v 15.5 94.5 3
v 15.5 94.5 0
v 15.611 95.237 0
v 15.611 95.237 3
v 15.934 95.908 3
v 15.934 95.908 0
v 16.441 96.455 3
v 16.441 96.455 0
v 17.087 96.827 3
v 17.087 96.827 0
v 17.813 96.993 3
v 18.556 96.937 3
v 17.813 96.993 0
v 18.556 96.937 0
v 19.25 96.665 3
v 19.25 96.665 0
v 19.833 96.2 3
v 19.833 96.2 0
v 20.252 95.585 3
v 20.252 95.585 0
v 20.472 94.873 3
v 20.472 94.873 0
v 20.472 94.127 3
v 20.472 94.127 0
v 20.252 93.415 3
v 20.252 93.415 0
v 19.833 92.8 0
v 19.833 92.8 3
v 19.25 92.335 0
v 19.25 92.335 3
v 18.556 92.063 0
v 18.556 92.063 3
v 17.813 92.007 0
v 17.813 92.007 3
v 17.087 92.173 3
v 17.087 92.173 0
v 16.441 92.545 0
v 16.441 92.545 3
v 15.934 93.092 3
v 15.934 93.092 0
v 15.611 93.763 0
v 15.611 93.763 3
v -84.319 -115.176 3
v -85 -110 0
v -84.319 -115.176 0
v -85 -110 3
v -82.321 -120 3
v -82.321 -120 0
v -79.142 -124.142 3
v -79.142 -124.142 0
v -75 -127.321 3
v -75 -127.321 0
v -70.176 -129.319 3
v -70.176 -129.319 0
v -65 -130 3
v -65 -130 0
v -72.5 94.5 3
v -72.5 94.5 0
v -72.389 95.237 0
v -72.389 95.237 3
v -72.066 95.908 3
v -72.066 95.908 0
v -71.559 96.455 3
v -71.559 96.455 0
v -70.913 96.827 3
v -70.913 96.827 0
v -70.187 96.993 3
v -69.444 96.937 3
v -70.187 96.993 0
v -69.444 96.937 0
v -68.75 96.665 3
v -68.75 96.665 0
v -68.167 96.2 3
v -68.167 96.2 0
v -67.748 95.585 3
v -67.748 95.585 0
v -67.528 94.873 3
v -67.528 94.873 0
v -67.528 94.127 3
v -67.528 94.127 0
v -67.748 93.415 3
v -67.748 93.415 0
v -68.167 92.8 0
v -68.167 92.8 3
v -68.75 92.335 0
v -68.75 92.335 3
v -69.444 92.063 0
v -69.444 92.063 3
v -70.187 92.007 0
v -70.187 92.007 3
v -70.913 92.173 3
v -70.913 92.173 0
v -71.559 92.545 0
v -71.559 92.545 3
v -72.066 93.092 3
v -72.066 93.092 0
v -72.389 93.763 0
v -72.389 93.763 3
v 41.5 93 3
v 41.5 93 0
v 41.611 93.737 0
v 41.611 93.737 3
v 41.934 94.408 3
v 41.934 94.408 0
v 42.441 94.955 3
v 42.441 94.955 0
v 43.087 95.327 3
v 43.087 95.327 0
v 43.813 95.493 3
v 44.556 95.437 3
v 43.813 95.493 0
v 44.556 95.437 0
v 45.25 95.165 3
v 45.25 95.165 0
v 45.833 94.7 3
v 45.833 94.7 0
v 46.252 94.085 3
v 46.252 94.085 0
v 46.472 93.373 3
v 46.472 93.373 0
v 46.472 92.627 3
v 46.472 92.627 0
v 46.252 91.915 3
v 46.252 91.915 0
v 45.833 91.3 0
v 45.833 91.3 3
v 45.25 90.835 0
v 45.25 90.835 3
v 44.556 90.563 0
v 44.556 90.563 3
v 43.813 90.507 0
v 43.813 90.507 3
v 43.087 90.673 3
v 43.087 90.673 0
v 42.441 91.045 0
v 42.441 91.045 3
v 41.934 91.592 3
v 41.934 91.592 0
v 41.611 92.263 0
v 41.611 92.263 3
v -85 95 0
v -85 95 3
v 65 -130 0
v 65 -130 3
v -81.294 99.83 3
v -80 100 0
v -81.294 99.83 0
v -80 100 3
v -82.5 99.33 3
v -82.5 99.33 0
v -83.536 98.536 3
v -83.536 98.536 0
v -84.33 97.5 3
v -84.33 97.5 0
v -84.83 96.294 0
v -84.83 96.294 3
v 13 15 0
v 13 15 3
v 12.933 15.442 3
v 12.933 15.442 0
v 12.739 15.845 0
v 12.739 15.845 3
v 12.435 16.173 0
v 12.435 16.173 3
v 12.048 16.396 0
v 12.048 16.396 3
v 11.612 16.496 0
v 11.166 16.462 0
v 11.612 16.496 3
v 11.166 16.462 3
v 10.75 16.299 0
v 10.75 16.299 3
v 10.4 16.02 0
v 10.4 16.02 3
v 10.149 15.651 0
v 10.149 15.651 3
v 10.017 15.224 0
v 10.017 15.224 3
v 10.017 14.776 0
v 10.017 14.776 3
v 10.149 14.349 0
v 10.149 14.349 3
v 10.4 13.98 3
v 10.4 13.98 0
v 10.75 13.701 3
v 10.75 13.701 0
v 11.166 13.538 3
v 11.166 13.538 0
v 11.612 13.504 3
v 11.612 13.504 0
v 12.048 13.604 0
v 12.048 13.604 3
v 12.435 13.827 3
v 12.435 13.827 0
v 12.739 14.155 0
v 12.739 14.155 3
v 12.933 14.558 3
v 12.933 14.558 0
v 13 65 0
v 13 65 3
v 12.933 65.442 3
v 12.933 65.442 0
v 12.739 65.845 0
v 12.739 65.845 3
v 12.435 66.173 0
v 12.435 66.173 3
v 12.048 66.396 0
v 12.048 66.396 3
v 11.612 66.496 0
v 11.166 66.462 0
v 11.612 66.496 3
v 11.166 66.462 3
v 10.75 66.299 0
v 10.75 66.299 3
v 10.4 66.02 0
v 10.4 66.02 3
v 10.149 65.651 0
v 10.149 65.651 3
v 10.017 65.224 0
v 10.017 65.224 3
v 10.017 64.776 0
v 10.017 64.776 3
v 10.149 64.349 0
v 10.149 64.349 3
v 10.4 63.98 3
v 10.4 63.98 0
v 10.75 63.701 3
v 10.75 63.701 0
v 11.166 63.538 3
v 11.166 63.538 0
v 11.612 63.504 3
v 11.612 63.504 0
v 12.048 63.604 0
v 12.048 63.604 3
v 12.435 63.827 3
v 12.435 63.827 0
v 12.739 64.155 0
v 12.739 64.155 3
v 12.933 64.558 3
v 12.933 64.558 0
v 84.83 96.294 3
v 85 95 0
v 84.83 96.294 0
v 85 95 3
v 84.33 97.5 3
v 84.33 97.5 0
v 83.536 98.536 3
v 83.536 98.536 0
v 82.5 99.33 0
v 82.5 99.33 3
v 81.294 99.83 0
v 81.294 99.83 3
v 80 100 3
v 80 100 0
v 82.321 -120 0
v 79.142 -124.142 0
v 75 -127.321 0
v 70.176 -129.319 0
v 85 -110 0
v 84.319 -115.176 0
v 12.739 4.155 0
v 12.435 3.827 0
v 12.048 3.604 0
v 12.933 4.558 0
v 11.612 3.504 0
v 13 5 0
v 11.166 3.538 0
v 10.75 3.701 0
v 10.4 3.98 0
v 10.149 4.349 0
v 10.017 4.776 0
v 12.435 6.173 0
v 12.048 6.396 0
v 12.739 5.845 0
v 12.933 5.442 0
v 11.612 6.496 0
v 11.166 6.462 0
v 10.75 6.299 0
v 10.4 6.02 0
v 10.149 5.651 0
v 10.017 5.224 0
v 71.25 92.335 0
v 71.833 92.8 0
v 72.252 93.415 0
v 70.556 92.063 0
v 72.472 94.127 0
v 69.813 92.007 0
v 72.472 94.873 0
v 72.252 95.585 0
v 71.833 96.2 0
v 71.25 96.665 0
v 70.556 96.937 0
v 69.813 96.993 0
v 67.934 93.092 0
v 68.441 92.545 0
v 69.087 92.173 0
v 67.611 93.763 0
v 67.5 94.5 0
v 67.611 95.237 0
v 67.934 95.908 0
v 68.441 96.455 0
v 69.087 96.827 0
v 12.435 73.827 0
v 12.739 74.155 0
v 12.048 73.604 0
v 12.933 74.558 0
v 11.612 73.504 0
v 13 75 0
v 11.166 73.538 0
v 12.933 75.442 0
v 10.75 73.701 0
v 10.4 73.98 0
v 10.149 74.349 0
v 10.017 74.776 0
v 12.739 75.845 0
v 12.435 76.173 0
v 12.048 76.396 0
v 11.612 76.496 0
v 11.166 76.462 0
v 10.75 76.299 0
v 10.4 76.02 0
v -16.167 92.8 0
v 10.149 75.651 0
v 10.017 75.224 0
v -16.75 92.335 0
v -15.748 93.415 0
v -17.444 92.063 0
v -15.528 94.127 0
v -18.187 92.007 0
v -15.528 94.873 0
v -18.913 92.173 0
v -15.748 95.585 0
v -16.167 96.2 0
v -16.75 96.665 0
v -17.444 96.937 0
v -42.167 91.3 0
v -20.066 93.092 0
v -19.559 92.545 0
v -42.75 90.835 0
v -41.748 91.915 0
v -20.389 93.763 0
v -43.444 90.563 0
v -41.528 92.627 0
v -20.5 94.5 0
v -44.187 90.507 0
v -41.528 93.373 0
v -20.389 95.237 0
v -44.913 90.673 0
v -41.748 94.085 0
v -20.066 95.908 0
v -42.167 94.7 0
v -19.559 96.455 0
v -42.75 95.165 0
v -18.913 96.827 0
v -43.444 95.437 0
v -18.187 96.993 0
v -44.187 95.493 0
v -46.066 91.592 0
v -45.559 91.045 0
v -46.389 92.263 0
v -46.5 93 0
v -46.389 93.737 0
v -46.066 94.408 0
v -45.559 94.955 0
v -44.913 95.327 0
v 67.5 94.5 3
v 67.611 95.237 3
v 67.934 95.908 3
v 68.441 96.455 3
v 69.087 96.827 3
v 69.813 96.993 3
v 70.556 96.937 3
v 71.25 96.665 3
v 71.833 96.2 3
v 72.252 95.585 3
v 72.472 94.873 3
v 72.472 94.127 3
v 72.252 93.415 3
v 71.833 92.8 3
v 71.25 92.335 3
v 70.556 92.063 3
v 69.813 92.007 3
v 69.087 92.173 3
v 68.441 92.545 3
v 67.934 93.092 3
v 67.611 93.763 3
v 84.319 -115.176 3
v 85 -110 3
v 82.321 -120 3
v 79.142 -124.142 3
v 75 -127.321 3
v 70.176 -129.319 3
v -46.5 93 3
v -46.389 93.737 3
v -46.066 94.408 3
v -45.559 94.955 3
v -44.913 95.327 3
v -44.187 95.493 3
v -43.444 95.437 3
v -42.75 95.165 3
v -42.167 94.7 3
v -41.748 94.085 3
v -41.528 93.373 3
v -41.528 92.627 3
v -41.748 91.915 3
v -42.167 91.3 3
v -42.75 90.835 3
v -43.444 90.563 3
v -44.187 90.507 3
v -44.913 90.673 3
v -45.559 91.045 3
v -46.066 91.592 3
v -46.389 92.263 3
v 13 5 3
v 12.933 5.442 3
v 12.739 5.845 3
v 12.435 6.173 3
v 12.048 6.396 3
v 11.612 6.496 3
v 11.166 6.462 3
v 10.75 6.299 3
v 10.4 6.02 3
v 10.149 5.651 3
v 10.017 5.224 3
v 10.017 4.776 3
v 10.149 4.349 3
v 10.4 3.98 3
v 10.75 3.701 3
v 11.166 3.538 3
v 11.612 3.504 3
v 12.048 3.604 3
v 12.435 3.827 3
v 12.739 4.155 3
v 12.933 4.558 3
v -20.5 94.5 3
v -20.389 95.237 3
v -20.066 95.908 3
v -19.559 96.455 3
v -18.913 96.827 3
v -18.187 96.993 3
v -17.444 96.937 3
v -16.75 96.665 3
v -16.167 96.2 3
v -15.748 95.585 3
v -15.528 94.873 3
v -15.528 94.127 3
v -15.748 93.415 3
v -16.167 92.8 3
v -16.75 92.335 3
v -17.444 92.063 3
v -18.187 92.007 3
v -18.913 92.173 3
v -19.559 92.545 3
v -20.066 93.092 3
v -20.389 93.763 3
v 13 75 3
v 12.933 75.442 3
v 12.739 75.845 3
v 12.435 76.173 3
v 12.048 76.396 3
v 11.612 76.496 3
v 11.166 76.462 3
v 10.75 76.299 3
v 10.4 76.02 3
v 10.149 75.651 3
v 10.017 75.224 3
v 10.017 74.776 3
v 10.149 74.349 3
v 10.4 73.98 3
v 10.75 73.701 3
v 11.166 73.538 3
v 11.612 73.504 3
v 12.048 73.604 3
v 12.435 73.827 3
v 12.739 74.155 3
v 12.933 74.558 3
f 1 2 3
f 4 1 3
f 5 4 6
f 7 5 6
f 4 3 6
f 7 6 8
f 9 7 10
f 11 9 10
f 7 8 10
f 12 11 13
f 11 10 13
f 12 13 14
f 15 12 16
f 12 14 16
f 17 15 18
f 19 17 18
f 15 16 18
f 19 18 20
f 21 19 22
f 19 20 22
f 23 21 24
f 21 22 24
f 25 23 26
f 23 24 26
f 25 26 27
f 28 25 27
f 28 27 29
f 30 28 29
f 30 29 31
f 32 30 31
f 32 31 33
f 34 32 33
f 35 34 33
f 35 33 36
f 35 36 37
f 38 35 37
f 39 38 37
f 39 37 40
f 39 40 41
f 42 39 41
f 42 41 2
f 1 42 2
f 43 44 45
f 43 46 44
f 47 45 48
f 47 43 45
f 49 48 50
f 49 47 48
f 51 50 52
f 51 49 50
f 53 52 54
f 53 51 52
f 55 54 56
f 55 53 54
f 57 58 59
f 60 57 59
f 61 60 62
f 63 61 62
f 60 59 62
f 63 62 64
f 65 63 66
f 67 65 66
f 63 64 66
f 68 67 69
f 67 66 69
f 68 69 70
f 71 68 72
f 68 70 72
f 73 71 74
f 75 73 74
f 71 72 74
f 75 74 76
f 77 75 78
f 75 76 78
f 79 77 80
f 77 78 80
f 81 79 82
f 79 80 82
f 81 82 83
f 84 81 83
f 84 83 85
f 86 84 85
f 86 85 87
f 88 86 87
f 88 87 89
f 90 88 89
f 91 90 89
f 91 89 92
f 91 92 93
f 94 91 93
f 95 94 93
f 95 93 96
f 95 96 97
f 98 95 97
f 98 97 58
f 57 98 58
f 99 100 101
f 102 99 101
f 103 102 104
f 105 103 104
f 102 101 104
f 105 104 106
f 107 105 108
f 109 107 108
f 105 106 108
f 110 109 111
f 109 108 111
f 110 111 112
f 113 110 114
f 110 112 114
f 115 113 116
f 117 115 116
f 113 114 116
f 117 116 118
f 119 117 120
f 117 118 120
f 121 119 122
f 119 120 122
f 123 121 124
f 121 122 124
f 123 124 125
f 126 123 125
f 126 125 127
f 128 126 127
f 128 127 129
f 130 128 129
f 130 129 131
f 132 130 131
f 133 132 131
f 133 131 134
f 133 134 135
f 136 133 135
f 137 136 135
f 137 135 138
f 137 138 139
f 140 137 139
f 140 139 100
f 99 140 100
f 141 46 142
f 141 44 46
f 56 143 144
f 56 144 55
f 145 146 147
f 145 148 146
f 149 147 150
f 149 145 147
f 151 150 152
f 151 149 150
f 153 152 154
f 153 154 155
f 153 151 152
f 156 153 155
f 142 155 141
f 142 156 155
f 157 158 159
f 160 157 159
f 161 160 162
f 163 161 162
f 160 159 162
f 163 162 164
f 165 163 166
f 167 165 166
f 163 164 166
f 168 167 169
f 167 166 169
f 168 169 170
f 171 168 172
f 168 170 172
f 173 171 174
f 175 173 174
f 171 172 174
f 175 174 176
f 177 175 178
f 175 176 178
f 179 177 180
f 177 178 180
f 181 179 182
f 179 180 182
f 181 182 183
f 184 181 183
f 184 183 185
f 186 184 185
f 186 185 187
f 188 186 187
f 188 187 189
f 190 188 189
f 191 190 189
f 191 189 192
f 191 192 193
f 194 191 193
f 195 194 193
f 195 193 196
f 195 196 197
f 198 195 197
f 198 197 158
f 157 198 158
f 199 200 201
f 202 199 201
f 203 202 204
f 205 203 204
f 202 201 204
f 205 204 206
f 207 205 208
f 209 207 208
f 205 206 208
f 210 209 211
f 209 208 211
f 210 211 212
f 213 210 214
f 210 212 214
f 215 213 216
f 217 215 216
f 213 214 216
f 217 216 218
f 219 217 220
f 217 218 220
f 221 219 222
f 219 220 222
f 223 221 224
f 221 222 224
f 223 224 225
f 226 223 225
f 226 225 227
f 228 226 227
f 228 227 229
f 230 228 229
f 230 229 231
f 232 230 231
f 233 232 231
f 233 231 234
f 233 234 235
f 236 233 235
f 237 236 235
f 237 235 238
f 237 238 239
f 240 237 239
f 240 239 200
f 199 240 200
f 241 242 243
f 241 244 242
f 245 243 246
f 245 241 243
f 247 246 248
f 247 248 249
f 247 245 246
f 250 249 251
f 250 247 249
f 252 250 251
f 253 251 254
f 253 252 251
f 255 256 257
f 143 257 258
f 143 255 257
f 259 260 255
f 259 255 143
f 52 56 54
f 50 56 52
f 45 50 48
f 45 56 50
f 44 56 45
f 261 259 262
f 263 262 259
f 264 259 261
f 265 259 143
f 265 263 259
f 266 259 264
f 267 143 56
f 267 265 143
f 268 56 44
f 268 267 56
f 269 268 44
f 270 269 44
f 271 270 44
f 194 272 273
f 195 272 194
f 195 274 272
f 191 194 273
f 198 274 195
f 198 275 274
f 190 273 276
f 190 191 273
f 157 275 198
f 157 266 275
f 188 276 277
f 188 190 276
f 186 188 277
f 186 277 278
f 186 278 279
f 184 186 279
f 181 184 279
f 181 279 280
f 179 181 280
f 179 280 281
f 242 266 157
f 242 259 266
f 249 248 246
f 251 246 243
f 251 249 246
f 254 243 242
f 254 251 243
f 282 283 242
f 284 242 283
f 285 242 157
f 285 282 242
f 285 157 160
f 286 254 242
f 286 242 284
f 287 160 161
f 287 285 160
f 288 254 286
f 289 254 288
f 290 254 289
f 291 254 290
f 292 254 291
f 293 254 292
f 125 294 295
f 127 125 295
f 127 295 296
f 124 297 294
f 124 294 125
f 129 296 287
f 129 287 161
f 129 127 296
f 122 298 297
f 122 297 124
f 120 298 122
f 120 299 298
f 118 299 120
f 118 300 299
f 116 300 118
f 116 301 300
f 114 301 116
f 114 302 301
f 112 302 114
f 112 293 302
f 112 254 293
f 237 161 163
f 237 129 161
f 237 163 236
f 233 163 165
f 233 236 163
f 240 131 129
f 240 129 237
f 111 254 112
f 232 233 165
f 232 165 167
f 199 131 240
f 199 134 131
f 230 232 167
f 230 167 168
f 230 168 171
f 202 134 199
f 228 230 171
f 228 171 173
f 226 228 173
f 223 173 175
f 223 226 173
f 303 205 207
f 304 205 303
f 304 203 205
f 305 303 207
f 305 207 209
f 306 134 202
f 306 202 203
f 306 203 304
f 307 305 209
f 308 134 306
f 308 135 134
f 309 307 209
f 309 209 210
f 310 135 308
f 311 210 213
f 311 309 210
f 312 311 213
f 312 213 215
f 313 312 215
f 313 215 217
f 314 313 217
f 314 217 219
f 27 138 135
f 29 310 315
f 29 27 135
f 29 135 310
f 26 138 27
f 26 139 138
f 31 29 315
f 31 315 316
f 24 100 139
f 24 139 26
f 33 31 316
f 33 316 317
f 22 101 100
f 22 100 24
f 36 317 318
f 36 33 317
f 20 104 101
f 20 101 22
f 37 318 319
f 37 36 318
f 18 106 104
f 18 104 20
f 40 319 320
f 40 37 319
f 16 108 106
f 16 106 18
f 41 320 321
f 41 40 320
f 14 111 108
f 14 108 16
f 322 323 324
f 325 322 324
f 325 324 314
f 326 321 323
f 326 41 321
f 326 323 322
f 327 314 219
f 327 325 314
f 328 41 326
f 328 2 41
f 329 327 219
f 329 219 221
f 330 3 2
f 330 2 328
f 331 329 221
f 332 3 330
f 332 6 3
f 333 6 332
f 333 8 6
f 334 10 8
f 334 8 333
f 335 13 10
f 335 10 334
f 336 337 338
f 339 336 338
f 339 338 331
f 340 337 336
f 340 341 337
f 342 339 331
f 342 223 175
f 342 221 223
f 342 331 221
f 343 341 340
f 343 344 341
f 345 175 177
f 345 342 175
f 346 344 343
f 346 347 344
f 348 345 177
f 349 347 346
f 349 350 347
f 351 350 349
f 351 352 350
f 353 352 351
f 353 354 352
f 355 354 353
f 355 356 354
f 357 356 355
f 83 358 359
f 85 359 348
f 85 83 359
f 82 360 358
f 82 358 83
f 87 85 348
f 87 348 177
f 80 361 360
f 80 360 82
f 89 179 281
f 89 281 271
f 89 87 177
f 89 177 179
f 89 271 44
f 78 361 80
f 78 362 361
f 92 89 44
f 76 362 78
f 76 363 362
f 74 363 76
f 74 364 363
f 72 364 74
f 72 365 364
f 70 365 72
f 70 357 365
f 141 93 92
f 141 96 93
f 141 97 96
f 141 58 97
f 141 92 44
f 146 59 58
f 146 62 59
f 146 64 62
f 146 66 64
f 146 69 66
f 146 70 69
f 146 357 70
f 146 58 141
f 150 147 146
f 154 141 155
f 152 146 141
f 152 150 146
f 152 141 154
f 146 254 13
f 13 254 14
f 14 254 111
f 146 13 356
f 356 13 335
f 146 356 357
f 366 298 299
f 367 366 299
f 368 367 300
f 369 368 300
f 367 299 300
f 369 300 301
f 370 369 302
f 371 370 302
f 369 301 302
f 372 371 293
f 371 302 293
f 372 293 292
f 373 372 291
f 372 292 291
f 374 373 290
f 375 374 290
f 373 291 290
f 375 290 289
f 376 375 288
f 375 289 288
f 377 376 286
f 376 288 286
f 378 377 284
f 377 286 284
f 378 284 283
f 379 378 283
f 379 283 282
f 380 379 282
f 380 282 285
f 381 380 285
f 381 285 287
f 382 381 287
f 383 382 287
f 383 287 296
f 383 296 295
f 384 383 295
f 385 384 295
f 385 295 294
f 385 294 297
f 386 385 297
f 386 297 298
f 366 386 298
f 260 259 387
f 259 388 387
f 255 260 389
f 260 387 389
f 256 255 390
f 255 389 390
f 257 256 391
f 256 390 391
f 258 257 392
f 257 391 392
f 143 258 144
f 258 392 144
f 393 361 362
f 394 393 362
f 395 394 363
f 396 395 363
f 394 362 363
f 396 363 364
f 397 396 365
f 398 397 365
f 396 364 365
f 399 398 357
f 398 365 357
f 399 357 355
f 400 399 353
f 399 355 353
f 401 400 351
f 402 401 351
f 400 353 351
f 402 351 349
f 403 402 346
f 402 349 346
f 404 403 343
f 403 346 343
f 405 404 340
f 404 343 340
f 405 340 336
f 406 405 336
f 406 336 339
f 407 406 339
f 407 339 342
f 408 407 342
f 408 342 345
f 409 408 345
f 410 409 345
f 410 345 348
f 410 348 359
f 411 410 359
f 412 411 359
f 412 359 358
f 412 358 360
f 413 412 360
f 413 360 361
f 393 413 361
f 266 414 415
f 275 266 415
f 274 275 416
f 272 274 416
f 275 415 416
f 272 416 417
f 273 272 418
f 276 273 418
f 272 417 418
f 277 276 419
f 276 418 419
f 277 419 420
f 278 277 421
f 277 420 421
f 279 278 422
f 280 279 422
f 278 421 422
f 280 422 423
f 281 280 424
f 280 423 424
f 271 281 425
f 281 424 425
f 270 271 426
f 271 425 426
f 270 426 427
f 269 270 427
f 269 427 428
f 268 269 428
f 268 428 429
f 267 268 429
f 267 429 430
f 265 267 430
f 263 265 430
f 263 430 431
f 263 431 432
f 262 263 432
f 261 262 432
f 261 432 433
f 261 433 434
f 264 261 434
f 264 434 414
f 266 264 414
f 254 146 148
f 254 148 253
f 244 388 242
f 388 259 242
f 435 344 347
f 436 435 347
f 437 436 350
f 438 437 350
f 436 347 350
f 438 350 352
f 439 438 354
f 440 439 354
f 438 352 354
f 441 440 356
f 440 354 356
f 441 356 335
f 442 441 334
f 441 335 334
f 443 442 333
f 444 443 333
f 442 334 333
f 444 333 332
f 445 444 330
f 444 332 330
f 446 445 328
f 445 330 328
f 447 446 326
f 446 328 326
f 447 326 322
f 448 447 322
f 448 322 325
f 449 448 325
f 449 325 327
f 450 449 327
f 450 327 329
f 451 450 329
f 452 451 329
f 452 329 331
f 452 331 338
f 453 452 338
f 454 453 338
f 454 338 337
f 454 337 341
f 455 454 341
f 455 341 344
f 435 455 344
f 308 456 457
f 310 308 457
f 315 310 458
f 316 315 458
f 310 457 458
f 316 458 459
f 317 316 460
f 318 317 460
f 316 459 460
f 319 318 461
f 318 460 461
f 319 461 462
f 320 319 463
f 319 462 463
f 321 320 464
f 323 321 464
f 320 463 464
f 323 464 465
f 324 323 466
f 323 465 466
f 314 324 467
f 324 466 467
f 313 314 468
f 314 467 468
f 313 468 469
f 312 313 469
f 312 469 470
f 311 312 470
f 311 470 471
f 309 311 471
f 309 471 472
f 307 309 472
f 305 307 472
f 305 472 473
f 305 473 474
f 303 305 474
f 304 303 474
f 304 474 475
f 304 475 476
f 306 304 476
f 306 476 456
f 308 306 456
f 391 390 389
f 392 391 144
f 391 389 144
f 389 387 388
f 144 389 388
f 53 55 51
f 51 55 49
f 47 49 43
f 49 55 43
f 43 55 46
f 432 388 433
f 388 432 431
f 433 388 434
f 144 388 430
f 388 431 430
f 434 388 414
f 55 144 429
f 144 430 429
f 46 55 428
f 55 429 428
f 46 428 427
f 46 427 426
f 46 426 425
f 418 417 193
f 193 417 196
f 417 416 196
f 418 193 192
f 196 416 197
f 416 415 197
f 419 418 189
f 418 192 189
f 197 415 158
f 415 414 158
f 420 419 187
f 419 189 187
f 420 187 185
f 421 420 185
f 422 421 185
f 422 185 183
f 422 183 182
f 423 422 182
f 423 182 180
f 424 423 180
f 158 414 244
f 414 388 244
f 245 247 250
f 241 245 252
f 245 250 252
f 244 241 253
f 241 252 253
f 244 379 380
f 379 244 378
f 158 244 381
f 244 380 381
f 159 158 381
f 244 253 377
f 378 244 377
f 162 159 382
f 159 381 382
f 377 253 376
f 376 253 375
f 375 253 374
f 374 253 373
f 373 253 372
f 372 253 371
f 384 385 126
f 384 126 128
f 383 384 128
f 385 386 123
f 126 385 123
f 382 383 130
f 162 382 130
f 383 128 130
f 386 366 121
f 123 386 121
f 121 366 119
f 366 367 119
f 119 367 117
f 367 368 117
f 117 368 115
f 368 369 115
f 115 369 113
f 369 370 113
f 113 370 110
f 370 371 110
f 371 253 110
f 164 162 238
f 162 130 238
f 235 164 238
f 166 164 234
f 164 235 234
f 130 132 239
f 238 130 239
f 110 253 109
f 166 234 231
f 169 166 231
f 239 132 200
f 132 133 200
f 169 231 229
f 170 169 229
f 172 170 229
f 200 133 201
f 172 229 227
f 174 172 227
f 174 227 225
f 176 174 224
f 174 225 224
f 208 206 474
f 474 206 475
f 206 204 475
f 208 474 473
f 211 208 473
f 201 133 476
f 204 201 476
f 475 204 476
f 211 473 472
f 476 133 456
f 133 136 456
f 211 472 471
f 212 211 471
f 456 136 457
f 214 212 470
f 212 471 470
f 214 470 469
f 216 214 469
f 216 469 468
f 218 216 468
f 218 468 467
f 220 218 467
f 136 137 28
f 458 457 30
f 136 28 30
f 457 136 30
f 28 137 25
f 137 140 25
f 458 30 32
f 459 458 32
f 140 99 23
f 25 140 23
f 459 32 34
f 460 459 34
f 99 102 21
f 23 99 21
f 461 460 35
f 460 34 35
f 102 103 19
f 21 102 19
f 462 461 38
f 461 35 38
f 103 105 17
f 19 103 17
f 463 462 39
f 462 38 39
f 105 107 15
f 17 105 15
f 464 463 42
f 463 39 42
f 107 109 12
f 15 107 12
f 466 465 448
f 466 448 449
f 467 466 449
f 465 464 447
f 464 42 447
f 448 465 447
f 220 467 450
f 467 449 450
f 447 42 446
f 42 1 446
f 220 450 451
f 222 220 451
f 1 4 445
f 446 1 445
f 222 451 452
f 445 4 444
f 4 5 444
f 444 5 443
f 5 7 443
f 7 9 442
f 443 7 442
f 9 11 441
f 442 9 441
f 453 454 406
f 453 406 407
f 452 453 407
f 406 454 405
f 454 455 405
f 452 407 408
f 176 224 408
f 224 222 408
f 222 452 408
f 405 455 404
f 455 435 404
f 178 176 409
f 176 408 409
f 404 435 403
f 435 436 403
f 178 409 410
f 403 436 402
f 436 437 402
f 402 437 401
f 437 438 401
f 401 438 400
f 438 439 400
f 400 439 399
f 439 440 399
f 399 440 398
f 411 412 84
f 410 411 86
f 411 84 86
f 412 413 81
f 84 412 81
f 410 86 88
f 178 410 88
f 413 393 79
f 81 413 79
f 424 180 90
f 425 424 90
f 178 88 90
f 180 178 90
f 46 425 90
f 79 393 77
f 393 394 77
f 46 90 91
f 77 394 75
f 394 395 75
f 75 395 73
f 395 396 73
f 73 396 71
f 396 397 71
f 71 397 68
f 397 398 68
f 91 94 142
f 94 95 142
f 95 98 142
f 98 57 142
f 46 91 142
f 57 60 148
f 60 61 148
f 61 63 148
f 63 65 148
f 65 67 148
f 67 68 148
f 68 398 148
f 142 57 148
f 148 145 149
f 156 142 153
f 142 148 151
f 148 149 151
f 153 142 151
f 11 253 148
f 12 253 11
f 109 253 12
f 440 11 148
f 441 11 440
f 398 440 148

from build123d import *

# Parameters (mm, degrees)
SKETCH_1_W          = 170
SKETCH_1_H          = 200
EXTRUDE_1_DEPTH     = 3
SKETCH_4_W          = 170
SKETCH_4_H          = 30
EXTRUDE_2_DEPTH     = 3
FILLET_1_R          = 20
FILLET_2_R          = 5
SKETCH_6_R          = 1.5
CUT_EXTRUDE_3_DEPTH = 4
SKETCH_7_R          = 2.5
CUT_EXTRUDE_4_DEPTH = 10


with BuildPart() as part:
    # 草图1 → 凸台-拉伸1 (new body)
    with BuildSketch(Plane.XY):
        Rectangle(SKETCH_1_W, SKETCH_1_H)
    extrude(amount=EXTRUDE_1_DEPTH)

    # 草图4 → 凸台-拉伸2 (add)
    with BuildSketch(Plane(origin=(0, 0, 0), x_dir=(-1, 0, 0), z_dir=(0, 0, -1))):
        with Locations((0, -115)):
            Rectangle(SKETCH_4_W, SKETCH_4_H)
    extrude(amount=-EXTRUDE_2_DEPTH)

    # 圆角1
    fillet_1_edges = [part.edges().sort_by_distance(p)[0] for p in [
        (-85, -130, 1.5),
        (85, -130, 1.5),
    ]]
    fillet(fillet_1_edges, radius=FILLET_1_R)

    # 圆角2
    fillet_2_edges = [part.edges().sort_by_distance(p)[0] for p in [
        (-85, 100, 1.5),
        (85, 100, 1.5),
    ]]
    fillet(fillet_2_edges, radius=FILLET_2_R)

    # 草图6 → 切除-拉伸3 (cut, through all)
    with BuildSketch(Plane.XY.offset(3)):
        with Locations((11.5, 5)):
            Circle(SKETCH_6_R)
        with Locations((11.5, 15)):
            Circle(SKETCH_6_R)
        with Locations((11.5, 65)):
            Circle(SKETCH_6_R)
        with Locations((11.5, 75)):
            Circle(SKETCH_6_R)
    extrude(amount=-CUT_EXTRUDE_3_DEPTH, mode=Mode.SUBTRACT)

    # 草图7 → 切除-拉伸4 (cut)
    with BuildSketch(Plane(origin=(0, 0, 0), x_dir=(-1, 0, 0), z_dir=(0, 0, -1))):
        with Locations((-18, 94.5)):
            Circle(SKETCH_7_R)
        with Locations((-70, 94.5)):
            Circle(SKETCH_7_R)
        with Locations((-44, 93)):
            Circle(SKETCH_7_R)
        with Locations((70, 94.5)):
            Circle(SKETCH_7_R)
        with Locations((44, 93)):
            Circle(SKETCH_7_R)
        with Locations((18, 94.5)):
            Circle(SKETCH_7_R)
    extrude(amount=-CUT_EXTRUDE_4_DEPTH, mode=Mode.SUBTRACT)


solid = part.part
